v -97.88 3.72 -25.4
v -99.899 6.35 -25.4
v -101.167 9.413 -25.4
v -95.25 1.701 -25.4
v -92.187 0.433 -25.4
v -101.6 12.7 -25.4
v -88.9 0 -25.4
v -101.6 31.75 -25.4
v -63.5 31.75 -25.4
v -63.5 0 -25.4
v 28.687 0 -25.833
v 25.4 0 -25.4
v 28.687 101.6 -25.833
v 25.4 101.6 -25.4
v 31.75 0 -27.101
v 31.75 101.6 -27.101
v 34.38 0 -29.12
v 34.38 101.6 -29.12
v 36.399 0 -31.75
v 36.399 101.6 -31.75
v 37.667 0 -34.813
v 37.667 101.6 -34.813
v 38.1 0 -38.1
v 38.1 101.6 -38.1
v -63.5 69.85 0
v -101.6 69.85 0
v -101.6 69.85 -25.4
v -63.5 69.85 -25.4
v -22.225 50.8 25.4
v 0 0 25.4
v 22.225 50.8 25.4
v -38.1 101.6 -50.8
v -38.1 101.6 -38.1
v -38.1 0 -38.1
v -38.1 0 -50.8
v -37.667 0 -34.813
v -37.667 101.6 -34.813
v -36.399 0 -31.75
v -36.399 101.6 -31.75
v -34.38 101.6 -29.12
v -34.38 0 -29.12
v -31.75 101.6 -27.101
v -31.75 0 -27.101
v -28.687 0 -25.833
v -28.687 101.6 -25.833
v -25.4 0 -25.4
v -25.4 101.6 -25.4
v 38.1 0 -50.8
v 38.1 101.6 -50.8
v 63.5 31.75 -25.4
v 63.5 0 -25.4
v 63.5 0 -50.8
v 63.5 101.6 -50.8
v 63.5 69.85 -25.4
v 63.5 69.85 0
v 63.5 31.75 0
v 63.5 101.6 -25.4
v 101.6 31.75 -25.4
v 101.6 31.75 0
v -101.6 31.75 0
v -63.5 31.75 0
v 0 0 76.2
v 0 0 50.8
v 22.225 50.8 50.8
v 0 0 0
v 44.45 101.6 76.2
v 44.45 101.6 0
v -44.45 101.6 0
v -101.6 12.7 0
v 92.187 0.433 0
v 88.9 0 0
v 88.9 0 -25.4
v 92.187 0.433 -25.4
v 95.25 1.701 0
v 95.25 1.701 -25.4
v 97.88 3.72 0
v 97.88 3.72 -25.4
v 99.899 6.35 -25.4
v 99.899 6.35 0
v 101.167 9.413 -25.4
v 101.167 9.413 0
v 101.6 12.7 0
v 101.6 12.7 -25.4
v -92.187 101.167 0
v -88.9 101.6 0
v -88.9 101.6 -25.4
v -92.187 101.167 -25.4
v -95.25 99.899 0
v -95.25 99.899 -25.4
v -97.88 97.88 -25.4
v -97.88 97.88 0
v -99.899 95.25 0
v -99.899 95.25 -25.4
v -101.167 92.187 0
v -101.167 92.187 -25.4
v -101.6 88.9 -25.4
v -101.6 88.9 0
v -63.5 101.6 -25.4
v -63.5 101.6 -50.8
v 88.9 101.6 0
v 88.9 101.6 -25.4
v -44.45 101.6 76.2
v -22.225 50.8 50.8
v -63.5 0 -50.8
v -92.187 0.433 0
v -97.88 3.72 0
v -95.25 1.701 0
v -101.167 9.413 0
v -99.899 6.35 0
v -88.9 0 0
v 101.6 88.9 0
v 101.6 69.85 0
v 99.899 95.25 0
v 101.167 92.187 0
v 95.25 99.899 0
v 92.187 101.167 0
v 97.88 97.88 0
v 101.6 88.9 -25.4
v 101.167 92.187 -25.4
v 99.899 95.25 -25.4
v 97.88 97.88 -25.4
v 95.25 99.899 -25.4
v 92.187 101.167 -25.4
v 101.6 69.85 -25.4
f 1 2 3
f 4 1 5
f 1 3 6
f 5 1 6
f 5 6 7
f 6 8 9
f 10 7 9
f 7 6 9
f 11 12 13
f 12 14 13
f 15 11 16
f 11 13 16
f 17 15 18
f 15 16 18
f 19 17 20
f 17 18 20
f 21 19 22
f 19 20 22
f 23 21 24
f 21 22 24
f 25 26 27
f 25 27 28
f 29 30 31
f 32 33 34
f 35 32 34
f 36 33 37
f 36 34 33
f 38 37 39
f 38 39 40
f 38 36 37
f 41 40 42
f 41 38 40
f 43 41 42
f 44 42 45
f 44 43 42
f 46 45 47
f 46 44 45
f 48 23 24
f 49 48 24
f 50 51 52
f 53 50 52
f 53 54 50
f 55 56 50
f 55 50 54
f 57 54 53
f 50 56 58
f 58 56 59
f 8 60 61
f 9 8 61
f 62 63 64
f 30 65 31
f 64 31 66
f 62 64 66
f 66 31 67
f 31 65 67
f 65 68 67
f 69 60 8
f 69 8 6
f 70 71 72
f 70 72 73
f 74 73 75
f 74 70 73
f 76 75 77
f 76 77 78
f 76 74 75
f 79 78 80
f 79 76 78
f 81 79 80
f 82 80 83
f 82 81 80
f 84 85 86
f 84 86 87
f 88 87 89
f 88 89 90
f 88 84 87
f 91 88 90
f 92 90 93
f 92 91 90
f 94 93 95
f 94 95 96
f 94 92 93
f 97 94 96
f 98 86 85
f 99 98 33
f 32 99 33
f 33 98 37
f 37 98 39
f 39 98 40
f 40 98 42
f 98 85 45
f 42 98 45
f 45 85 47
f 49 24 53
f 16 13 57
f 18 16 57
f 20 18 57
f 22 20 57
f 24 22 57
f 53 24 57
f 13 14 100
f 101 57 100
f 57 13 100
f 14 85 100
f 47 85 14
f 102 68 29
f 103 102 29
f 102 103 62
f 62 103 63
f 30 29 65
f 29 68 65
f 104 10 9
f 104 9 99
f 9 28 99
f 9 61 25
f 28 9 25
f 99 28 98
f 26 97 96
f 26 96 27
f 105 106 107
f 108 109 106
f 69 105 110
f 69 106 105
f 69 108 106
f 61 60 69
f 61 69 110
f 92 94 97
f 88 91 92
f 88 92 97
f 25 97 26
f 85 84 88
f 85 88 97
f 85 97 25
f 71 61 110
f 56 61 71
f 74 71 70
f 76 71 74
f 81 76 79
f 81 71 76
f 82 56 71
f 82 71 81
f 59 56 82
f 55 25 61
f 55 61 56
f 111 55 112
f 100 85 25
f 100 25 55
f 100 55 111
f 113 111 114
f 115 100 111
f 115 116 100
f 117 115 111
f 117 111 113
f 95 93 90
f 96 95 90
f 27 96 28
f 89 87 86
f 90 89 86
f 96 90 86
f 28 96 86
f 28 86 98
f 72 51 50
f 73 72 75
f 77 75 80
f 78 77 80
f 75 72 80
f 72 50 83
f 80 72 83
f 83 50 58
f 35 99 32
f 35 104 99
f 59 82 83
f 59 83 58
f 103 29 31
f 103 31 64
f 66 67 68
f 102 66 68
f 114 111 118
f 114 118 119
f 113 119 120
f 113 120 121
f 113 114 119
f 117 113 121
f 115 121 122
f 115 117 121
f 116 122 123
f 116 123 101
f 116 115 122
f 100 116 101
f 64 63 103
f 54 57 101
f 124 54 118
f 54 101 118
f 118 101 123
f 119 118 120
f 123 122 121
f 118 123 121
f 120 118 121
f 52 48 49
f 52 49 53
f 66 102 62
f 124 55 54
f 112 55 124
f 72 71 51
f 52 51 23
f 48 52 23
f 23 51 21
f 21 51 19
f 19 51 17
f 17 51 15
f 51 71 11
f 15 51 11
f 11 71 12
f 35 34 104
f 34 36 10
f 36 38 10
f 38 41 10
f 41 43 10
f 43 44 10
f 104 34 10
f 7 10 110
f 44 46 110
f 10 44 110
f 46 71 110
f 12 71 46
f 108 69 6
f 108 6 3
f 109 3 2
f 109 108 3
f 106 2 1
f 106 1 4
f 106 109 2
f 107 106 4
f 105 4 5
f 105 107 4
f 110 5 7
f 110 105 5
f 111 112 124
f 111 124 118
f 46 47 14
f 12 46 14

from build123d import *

# Parameters (mm, degrees)
F0_W     = 38.1
F0_H     = 38.1
F1_DEPTH = 25.4
F2_DEPTH = 25.4
F3_DEPTH = 76.2
F5_DEPTH = 25.4
F6_R     = 12.7
F7_W     = 50.8
F7_H     = 25.4
F8_DEPTH = 165.101


with BuildPart() as f1:
    # F0 (on Top) → F1 (new body)
    with BuildSketch(Plane.XY):
        with Locations((-82.55, 50.8)):
            Rectangle(F0_W, F0_H)
        with Locations((82.55, 50.8)):
            Rectangle(F0_W, F0_H)
        with BuildLine():
            ThreePointArc((-101.6, 12.7), (-97.8802561211, 3.7197438789), (-88.9, 0))
            Line((-88.9, 0), (0, 0))
            Line((0, 0), (-44.45, 101.6))
            Line((-44.45, 101.6), (-88.9, 101.6))
            ThreePointArc((-88.9, 101.6), (-97.8802561211, 97.8802561211), (-101.6, 88.9))
            Line((-101.6, 88.9), (-101.6, 69.85))
            Line((-101.6, 69.85), (-63.5, 69.85))
            Line((-63.5, 69.85), (-63.5, 31.75))
            Line((-63.5, 31.75), (-101.6, 31.75))
            Line((-101.6, 31.75), (-101.6, 12.7))
        make_face()
        with BuildLine():
            Line((44.45, 101.6), (0, 0))
            Line((0, 0), (88.9, 0))
            ThreePointArc((88.9, 0), (97.8802561211, 3.7197438789), (101.6, 12.7))
            Line((101.6, 12.7), (101.6, 31.75))
            Line((101.6, 31.75), (63.5, 31.75))
            Line((63.5, 31.75), (63.5, 69.85))
            Line((63.5, 69.85), (101.6, 69.85))
            Line((101.6, 69.85), (101.6, 88.9))
            ThreePointArc((101.6, 88.9), (97.8802561211, 97.8802561211), (88.9, 101.6))
            Line((88.9, 101.6), (44.45, 101.6))
        make_face()
        Polygon((-44.45, 101.6), (0, 0), (44.45, 101.6), align=None)
    extrude(amount=-F1_DEPTH)

    # F0 (on Top) → F2 (cut)
    with BuildSketch(Plane.XY):
        with Locations((82.55, 50.8)):
            Rectangle(F0_W, F0_H)
        with Locations((-82.55, 50.8)):
            Rectangle(F0_W, F0_H)
    extrude(amount=-F2_DEPTH, mode=Mode.SUBTRACT)

    # F4 (on face) → F5 (join)
    with BuildSketch(Plane(origin=(0, 0, -25.4), x_dir=(1, 0, 0), z_dir=(0, 0, -1))):
        Polygon((-63.5, -101.6), (-38.1, -101.6), (-38.1, 0), (-63.5, 0), (-63.5, -31.75), (-63.5, -69.85), align=None)
        Polygon((63.5, -101.6), (63.5, -69.85), (63.5, -31.75), (63.5, 0), (38.1, 0), (38.1, -101.6), align=None)
    extrude(amount=F5_DEPTH)

    # F6
    f6_edges = [f1.edges().sort_by_distance(p)[0] for p in [
        (-38.1, 50.8, -25.4),
        (38.1, 50.8, -25.4),
    ]]
    fillet(f6_edges, radius=F6_R)


with BuildPart() as f3:
    # F0 (on Top) → F3 (new body)
    with BuildSketch(Plane.XY):
        Polygon((-44.45, 101.6), (0, 0), (44.45, 101.6), align=None)
    extrude(amount=F3_DEPTH)

    # F7 (on face) → F8 (cut, through all)
    with BuildSketch(Plane.YZ.offset(63.5)):
        with Locations((25.4, 38.1)):
            Rectangle(F7_W, F7_H)
    extrude(amount=-F8_DEPTH, mode=Mode.SUBTRACT)


solid = Compound([f1.part, f3.part])
